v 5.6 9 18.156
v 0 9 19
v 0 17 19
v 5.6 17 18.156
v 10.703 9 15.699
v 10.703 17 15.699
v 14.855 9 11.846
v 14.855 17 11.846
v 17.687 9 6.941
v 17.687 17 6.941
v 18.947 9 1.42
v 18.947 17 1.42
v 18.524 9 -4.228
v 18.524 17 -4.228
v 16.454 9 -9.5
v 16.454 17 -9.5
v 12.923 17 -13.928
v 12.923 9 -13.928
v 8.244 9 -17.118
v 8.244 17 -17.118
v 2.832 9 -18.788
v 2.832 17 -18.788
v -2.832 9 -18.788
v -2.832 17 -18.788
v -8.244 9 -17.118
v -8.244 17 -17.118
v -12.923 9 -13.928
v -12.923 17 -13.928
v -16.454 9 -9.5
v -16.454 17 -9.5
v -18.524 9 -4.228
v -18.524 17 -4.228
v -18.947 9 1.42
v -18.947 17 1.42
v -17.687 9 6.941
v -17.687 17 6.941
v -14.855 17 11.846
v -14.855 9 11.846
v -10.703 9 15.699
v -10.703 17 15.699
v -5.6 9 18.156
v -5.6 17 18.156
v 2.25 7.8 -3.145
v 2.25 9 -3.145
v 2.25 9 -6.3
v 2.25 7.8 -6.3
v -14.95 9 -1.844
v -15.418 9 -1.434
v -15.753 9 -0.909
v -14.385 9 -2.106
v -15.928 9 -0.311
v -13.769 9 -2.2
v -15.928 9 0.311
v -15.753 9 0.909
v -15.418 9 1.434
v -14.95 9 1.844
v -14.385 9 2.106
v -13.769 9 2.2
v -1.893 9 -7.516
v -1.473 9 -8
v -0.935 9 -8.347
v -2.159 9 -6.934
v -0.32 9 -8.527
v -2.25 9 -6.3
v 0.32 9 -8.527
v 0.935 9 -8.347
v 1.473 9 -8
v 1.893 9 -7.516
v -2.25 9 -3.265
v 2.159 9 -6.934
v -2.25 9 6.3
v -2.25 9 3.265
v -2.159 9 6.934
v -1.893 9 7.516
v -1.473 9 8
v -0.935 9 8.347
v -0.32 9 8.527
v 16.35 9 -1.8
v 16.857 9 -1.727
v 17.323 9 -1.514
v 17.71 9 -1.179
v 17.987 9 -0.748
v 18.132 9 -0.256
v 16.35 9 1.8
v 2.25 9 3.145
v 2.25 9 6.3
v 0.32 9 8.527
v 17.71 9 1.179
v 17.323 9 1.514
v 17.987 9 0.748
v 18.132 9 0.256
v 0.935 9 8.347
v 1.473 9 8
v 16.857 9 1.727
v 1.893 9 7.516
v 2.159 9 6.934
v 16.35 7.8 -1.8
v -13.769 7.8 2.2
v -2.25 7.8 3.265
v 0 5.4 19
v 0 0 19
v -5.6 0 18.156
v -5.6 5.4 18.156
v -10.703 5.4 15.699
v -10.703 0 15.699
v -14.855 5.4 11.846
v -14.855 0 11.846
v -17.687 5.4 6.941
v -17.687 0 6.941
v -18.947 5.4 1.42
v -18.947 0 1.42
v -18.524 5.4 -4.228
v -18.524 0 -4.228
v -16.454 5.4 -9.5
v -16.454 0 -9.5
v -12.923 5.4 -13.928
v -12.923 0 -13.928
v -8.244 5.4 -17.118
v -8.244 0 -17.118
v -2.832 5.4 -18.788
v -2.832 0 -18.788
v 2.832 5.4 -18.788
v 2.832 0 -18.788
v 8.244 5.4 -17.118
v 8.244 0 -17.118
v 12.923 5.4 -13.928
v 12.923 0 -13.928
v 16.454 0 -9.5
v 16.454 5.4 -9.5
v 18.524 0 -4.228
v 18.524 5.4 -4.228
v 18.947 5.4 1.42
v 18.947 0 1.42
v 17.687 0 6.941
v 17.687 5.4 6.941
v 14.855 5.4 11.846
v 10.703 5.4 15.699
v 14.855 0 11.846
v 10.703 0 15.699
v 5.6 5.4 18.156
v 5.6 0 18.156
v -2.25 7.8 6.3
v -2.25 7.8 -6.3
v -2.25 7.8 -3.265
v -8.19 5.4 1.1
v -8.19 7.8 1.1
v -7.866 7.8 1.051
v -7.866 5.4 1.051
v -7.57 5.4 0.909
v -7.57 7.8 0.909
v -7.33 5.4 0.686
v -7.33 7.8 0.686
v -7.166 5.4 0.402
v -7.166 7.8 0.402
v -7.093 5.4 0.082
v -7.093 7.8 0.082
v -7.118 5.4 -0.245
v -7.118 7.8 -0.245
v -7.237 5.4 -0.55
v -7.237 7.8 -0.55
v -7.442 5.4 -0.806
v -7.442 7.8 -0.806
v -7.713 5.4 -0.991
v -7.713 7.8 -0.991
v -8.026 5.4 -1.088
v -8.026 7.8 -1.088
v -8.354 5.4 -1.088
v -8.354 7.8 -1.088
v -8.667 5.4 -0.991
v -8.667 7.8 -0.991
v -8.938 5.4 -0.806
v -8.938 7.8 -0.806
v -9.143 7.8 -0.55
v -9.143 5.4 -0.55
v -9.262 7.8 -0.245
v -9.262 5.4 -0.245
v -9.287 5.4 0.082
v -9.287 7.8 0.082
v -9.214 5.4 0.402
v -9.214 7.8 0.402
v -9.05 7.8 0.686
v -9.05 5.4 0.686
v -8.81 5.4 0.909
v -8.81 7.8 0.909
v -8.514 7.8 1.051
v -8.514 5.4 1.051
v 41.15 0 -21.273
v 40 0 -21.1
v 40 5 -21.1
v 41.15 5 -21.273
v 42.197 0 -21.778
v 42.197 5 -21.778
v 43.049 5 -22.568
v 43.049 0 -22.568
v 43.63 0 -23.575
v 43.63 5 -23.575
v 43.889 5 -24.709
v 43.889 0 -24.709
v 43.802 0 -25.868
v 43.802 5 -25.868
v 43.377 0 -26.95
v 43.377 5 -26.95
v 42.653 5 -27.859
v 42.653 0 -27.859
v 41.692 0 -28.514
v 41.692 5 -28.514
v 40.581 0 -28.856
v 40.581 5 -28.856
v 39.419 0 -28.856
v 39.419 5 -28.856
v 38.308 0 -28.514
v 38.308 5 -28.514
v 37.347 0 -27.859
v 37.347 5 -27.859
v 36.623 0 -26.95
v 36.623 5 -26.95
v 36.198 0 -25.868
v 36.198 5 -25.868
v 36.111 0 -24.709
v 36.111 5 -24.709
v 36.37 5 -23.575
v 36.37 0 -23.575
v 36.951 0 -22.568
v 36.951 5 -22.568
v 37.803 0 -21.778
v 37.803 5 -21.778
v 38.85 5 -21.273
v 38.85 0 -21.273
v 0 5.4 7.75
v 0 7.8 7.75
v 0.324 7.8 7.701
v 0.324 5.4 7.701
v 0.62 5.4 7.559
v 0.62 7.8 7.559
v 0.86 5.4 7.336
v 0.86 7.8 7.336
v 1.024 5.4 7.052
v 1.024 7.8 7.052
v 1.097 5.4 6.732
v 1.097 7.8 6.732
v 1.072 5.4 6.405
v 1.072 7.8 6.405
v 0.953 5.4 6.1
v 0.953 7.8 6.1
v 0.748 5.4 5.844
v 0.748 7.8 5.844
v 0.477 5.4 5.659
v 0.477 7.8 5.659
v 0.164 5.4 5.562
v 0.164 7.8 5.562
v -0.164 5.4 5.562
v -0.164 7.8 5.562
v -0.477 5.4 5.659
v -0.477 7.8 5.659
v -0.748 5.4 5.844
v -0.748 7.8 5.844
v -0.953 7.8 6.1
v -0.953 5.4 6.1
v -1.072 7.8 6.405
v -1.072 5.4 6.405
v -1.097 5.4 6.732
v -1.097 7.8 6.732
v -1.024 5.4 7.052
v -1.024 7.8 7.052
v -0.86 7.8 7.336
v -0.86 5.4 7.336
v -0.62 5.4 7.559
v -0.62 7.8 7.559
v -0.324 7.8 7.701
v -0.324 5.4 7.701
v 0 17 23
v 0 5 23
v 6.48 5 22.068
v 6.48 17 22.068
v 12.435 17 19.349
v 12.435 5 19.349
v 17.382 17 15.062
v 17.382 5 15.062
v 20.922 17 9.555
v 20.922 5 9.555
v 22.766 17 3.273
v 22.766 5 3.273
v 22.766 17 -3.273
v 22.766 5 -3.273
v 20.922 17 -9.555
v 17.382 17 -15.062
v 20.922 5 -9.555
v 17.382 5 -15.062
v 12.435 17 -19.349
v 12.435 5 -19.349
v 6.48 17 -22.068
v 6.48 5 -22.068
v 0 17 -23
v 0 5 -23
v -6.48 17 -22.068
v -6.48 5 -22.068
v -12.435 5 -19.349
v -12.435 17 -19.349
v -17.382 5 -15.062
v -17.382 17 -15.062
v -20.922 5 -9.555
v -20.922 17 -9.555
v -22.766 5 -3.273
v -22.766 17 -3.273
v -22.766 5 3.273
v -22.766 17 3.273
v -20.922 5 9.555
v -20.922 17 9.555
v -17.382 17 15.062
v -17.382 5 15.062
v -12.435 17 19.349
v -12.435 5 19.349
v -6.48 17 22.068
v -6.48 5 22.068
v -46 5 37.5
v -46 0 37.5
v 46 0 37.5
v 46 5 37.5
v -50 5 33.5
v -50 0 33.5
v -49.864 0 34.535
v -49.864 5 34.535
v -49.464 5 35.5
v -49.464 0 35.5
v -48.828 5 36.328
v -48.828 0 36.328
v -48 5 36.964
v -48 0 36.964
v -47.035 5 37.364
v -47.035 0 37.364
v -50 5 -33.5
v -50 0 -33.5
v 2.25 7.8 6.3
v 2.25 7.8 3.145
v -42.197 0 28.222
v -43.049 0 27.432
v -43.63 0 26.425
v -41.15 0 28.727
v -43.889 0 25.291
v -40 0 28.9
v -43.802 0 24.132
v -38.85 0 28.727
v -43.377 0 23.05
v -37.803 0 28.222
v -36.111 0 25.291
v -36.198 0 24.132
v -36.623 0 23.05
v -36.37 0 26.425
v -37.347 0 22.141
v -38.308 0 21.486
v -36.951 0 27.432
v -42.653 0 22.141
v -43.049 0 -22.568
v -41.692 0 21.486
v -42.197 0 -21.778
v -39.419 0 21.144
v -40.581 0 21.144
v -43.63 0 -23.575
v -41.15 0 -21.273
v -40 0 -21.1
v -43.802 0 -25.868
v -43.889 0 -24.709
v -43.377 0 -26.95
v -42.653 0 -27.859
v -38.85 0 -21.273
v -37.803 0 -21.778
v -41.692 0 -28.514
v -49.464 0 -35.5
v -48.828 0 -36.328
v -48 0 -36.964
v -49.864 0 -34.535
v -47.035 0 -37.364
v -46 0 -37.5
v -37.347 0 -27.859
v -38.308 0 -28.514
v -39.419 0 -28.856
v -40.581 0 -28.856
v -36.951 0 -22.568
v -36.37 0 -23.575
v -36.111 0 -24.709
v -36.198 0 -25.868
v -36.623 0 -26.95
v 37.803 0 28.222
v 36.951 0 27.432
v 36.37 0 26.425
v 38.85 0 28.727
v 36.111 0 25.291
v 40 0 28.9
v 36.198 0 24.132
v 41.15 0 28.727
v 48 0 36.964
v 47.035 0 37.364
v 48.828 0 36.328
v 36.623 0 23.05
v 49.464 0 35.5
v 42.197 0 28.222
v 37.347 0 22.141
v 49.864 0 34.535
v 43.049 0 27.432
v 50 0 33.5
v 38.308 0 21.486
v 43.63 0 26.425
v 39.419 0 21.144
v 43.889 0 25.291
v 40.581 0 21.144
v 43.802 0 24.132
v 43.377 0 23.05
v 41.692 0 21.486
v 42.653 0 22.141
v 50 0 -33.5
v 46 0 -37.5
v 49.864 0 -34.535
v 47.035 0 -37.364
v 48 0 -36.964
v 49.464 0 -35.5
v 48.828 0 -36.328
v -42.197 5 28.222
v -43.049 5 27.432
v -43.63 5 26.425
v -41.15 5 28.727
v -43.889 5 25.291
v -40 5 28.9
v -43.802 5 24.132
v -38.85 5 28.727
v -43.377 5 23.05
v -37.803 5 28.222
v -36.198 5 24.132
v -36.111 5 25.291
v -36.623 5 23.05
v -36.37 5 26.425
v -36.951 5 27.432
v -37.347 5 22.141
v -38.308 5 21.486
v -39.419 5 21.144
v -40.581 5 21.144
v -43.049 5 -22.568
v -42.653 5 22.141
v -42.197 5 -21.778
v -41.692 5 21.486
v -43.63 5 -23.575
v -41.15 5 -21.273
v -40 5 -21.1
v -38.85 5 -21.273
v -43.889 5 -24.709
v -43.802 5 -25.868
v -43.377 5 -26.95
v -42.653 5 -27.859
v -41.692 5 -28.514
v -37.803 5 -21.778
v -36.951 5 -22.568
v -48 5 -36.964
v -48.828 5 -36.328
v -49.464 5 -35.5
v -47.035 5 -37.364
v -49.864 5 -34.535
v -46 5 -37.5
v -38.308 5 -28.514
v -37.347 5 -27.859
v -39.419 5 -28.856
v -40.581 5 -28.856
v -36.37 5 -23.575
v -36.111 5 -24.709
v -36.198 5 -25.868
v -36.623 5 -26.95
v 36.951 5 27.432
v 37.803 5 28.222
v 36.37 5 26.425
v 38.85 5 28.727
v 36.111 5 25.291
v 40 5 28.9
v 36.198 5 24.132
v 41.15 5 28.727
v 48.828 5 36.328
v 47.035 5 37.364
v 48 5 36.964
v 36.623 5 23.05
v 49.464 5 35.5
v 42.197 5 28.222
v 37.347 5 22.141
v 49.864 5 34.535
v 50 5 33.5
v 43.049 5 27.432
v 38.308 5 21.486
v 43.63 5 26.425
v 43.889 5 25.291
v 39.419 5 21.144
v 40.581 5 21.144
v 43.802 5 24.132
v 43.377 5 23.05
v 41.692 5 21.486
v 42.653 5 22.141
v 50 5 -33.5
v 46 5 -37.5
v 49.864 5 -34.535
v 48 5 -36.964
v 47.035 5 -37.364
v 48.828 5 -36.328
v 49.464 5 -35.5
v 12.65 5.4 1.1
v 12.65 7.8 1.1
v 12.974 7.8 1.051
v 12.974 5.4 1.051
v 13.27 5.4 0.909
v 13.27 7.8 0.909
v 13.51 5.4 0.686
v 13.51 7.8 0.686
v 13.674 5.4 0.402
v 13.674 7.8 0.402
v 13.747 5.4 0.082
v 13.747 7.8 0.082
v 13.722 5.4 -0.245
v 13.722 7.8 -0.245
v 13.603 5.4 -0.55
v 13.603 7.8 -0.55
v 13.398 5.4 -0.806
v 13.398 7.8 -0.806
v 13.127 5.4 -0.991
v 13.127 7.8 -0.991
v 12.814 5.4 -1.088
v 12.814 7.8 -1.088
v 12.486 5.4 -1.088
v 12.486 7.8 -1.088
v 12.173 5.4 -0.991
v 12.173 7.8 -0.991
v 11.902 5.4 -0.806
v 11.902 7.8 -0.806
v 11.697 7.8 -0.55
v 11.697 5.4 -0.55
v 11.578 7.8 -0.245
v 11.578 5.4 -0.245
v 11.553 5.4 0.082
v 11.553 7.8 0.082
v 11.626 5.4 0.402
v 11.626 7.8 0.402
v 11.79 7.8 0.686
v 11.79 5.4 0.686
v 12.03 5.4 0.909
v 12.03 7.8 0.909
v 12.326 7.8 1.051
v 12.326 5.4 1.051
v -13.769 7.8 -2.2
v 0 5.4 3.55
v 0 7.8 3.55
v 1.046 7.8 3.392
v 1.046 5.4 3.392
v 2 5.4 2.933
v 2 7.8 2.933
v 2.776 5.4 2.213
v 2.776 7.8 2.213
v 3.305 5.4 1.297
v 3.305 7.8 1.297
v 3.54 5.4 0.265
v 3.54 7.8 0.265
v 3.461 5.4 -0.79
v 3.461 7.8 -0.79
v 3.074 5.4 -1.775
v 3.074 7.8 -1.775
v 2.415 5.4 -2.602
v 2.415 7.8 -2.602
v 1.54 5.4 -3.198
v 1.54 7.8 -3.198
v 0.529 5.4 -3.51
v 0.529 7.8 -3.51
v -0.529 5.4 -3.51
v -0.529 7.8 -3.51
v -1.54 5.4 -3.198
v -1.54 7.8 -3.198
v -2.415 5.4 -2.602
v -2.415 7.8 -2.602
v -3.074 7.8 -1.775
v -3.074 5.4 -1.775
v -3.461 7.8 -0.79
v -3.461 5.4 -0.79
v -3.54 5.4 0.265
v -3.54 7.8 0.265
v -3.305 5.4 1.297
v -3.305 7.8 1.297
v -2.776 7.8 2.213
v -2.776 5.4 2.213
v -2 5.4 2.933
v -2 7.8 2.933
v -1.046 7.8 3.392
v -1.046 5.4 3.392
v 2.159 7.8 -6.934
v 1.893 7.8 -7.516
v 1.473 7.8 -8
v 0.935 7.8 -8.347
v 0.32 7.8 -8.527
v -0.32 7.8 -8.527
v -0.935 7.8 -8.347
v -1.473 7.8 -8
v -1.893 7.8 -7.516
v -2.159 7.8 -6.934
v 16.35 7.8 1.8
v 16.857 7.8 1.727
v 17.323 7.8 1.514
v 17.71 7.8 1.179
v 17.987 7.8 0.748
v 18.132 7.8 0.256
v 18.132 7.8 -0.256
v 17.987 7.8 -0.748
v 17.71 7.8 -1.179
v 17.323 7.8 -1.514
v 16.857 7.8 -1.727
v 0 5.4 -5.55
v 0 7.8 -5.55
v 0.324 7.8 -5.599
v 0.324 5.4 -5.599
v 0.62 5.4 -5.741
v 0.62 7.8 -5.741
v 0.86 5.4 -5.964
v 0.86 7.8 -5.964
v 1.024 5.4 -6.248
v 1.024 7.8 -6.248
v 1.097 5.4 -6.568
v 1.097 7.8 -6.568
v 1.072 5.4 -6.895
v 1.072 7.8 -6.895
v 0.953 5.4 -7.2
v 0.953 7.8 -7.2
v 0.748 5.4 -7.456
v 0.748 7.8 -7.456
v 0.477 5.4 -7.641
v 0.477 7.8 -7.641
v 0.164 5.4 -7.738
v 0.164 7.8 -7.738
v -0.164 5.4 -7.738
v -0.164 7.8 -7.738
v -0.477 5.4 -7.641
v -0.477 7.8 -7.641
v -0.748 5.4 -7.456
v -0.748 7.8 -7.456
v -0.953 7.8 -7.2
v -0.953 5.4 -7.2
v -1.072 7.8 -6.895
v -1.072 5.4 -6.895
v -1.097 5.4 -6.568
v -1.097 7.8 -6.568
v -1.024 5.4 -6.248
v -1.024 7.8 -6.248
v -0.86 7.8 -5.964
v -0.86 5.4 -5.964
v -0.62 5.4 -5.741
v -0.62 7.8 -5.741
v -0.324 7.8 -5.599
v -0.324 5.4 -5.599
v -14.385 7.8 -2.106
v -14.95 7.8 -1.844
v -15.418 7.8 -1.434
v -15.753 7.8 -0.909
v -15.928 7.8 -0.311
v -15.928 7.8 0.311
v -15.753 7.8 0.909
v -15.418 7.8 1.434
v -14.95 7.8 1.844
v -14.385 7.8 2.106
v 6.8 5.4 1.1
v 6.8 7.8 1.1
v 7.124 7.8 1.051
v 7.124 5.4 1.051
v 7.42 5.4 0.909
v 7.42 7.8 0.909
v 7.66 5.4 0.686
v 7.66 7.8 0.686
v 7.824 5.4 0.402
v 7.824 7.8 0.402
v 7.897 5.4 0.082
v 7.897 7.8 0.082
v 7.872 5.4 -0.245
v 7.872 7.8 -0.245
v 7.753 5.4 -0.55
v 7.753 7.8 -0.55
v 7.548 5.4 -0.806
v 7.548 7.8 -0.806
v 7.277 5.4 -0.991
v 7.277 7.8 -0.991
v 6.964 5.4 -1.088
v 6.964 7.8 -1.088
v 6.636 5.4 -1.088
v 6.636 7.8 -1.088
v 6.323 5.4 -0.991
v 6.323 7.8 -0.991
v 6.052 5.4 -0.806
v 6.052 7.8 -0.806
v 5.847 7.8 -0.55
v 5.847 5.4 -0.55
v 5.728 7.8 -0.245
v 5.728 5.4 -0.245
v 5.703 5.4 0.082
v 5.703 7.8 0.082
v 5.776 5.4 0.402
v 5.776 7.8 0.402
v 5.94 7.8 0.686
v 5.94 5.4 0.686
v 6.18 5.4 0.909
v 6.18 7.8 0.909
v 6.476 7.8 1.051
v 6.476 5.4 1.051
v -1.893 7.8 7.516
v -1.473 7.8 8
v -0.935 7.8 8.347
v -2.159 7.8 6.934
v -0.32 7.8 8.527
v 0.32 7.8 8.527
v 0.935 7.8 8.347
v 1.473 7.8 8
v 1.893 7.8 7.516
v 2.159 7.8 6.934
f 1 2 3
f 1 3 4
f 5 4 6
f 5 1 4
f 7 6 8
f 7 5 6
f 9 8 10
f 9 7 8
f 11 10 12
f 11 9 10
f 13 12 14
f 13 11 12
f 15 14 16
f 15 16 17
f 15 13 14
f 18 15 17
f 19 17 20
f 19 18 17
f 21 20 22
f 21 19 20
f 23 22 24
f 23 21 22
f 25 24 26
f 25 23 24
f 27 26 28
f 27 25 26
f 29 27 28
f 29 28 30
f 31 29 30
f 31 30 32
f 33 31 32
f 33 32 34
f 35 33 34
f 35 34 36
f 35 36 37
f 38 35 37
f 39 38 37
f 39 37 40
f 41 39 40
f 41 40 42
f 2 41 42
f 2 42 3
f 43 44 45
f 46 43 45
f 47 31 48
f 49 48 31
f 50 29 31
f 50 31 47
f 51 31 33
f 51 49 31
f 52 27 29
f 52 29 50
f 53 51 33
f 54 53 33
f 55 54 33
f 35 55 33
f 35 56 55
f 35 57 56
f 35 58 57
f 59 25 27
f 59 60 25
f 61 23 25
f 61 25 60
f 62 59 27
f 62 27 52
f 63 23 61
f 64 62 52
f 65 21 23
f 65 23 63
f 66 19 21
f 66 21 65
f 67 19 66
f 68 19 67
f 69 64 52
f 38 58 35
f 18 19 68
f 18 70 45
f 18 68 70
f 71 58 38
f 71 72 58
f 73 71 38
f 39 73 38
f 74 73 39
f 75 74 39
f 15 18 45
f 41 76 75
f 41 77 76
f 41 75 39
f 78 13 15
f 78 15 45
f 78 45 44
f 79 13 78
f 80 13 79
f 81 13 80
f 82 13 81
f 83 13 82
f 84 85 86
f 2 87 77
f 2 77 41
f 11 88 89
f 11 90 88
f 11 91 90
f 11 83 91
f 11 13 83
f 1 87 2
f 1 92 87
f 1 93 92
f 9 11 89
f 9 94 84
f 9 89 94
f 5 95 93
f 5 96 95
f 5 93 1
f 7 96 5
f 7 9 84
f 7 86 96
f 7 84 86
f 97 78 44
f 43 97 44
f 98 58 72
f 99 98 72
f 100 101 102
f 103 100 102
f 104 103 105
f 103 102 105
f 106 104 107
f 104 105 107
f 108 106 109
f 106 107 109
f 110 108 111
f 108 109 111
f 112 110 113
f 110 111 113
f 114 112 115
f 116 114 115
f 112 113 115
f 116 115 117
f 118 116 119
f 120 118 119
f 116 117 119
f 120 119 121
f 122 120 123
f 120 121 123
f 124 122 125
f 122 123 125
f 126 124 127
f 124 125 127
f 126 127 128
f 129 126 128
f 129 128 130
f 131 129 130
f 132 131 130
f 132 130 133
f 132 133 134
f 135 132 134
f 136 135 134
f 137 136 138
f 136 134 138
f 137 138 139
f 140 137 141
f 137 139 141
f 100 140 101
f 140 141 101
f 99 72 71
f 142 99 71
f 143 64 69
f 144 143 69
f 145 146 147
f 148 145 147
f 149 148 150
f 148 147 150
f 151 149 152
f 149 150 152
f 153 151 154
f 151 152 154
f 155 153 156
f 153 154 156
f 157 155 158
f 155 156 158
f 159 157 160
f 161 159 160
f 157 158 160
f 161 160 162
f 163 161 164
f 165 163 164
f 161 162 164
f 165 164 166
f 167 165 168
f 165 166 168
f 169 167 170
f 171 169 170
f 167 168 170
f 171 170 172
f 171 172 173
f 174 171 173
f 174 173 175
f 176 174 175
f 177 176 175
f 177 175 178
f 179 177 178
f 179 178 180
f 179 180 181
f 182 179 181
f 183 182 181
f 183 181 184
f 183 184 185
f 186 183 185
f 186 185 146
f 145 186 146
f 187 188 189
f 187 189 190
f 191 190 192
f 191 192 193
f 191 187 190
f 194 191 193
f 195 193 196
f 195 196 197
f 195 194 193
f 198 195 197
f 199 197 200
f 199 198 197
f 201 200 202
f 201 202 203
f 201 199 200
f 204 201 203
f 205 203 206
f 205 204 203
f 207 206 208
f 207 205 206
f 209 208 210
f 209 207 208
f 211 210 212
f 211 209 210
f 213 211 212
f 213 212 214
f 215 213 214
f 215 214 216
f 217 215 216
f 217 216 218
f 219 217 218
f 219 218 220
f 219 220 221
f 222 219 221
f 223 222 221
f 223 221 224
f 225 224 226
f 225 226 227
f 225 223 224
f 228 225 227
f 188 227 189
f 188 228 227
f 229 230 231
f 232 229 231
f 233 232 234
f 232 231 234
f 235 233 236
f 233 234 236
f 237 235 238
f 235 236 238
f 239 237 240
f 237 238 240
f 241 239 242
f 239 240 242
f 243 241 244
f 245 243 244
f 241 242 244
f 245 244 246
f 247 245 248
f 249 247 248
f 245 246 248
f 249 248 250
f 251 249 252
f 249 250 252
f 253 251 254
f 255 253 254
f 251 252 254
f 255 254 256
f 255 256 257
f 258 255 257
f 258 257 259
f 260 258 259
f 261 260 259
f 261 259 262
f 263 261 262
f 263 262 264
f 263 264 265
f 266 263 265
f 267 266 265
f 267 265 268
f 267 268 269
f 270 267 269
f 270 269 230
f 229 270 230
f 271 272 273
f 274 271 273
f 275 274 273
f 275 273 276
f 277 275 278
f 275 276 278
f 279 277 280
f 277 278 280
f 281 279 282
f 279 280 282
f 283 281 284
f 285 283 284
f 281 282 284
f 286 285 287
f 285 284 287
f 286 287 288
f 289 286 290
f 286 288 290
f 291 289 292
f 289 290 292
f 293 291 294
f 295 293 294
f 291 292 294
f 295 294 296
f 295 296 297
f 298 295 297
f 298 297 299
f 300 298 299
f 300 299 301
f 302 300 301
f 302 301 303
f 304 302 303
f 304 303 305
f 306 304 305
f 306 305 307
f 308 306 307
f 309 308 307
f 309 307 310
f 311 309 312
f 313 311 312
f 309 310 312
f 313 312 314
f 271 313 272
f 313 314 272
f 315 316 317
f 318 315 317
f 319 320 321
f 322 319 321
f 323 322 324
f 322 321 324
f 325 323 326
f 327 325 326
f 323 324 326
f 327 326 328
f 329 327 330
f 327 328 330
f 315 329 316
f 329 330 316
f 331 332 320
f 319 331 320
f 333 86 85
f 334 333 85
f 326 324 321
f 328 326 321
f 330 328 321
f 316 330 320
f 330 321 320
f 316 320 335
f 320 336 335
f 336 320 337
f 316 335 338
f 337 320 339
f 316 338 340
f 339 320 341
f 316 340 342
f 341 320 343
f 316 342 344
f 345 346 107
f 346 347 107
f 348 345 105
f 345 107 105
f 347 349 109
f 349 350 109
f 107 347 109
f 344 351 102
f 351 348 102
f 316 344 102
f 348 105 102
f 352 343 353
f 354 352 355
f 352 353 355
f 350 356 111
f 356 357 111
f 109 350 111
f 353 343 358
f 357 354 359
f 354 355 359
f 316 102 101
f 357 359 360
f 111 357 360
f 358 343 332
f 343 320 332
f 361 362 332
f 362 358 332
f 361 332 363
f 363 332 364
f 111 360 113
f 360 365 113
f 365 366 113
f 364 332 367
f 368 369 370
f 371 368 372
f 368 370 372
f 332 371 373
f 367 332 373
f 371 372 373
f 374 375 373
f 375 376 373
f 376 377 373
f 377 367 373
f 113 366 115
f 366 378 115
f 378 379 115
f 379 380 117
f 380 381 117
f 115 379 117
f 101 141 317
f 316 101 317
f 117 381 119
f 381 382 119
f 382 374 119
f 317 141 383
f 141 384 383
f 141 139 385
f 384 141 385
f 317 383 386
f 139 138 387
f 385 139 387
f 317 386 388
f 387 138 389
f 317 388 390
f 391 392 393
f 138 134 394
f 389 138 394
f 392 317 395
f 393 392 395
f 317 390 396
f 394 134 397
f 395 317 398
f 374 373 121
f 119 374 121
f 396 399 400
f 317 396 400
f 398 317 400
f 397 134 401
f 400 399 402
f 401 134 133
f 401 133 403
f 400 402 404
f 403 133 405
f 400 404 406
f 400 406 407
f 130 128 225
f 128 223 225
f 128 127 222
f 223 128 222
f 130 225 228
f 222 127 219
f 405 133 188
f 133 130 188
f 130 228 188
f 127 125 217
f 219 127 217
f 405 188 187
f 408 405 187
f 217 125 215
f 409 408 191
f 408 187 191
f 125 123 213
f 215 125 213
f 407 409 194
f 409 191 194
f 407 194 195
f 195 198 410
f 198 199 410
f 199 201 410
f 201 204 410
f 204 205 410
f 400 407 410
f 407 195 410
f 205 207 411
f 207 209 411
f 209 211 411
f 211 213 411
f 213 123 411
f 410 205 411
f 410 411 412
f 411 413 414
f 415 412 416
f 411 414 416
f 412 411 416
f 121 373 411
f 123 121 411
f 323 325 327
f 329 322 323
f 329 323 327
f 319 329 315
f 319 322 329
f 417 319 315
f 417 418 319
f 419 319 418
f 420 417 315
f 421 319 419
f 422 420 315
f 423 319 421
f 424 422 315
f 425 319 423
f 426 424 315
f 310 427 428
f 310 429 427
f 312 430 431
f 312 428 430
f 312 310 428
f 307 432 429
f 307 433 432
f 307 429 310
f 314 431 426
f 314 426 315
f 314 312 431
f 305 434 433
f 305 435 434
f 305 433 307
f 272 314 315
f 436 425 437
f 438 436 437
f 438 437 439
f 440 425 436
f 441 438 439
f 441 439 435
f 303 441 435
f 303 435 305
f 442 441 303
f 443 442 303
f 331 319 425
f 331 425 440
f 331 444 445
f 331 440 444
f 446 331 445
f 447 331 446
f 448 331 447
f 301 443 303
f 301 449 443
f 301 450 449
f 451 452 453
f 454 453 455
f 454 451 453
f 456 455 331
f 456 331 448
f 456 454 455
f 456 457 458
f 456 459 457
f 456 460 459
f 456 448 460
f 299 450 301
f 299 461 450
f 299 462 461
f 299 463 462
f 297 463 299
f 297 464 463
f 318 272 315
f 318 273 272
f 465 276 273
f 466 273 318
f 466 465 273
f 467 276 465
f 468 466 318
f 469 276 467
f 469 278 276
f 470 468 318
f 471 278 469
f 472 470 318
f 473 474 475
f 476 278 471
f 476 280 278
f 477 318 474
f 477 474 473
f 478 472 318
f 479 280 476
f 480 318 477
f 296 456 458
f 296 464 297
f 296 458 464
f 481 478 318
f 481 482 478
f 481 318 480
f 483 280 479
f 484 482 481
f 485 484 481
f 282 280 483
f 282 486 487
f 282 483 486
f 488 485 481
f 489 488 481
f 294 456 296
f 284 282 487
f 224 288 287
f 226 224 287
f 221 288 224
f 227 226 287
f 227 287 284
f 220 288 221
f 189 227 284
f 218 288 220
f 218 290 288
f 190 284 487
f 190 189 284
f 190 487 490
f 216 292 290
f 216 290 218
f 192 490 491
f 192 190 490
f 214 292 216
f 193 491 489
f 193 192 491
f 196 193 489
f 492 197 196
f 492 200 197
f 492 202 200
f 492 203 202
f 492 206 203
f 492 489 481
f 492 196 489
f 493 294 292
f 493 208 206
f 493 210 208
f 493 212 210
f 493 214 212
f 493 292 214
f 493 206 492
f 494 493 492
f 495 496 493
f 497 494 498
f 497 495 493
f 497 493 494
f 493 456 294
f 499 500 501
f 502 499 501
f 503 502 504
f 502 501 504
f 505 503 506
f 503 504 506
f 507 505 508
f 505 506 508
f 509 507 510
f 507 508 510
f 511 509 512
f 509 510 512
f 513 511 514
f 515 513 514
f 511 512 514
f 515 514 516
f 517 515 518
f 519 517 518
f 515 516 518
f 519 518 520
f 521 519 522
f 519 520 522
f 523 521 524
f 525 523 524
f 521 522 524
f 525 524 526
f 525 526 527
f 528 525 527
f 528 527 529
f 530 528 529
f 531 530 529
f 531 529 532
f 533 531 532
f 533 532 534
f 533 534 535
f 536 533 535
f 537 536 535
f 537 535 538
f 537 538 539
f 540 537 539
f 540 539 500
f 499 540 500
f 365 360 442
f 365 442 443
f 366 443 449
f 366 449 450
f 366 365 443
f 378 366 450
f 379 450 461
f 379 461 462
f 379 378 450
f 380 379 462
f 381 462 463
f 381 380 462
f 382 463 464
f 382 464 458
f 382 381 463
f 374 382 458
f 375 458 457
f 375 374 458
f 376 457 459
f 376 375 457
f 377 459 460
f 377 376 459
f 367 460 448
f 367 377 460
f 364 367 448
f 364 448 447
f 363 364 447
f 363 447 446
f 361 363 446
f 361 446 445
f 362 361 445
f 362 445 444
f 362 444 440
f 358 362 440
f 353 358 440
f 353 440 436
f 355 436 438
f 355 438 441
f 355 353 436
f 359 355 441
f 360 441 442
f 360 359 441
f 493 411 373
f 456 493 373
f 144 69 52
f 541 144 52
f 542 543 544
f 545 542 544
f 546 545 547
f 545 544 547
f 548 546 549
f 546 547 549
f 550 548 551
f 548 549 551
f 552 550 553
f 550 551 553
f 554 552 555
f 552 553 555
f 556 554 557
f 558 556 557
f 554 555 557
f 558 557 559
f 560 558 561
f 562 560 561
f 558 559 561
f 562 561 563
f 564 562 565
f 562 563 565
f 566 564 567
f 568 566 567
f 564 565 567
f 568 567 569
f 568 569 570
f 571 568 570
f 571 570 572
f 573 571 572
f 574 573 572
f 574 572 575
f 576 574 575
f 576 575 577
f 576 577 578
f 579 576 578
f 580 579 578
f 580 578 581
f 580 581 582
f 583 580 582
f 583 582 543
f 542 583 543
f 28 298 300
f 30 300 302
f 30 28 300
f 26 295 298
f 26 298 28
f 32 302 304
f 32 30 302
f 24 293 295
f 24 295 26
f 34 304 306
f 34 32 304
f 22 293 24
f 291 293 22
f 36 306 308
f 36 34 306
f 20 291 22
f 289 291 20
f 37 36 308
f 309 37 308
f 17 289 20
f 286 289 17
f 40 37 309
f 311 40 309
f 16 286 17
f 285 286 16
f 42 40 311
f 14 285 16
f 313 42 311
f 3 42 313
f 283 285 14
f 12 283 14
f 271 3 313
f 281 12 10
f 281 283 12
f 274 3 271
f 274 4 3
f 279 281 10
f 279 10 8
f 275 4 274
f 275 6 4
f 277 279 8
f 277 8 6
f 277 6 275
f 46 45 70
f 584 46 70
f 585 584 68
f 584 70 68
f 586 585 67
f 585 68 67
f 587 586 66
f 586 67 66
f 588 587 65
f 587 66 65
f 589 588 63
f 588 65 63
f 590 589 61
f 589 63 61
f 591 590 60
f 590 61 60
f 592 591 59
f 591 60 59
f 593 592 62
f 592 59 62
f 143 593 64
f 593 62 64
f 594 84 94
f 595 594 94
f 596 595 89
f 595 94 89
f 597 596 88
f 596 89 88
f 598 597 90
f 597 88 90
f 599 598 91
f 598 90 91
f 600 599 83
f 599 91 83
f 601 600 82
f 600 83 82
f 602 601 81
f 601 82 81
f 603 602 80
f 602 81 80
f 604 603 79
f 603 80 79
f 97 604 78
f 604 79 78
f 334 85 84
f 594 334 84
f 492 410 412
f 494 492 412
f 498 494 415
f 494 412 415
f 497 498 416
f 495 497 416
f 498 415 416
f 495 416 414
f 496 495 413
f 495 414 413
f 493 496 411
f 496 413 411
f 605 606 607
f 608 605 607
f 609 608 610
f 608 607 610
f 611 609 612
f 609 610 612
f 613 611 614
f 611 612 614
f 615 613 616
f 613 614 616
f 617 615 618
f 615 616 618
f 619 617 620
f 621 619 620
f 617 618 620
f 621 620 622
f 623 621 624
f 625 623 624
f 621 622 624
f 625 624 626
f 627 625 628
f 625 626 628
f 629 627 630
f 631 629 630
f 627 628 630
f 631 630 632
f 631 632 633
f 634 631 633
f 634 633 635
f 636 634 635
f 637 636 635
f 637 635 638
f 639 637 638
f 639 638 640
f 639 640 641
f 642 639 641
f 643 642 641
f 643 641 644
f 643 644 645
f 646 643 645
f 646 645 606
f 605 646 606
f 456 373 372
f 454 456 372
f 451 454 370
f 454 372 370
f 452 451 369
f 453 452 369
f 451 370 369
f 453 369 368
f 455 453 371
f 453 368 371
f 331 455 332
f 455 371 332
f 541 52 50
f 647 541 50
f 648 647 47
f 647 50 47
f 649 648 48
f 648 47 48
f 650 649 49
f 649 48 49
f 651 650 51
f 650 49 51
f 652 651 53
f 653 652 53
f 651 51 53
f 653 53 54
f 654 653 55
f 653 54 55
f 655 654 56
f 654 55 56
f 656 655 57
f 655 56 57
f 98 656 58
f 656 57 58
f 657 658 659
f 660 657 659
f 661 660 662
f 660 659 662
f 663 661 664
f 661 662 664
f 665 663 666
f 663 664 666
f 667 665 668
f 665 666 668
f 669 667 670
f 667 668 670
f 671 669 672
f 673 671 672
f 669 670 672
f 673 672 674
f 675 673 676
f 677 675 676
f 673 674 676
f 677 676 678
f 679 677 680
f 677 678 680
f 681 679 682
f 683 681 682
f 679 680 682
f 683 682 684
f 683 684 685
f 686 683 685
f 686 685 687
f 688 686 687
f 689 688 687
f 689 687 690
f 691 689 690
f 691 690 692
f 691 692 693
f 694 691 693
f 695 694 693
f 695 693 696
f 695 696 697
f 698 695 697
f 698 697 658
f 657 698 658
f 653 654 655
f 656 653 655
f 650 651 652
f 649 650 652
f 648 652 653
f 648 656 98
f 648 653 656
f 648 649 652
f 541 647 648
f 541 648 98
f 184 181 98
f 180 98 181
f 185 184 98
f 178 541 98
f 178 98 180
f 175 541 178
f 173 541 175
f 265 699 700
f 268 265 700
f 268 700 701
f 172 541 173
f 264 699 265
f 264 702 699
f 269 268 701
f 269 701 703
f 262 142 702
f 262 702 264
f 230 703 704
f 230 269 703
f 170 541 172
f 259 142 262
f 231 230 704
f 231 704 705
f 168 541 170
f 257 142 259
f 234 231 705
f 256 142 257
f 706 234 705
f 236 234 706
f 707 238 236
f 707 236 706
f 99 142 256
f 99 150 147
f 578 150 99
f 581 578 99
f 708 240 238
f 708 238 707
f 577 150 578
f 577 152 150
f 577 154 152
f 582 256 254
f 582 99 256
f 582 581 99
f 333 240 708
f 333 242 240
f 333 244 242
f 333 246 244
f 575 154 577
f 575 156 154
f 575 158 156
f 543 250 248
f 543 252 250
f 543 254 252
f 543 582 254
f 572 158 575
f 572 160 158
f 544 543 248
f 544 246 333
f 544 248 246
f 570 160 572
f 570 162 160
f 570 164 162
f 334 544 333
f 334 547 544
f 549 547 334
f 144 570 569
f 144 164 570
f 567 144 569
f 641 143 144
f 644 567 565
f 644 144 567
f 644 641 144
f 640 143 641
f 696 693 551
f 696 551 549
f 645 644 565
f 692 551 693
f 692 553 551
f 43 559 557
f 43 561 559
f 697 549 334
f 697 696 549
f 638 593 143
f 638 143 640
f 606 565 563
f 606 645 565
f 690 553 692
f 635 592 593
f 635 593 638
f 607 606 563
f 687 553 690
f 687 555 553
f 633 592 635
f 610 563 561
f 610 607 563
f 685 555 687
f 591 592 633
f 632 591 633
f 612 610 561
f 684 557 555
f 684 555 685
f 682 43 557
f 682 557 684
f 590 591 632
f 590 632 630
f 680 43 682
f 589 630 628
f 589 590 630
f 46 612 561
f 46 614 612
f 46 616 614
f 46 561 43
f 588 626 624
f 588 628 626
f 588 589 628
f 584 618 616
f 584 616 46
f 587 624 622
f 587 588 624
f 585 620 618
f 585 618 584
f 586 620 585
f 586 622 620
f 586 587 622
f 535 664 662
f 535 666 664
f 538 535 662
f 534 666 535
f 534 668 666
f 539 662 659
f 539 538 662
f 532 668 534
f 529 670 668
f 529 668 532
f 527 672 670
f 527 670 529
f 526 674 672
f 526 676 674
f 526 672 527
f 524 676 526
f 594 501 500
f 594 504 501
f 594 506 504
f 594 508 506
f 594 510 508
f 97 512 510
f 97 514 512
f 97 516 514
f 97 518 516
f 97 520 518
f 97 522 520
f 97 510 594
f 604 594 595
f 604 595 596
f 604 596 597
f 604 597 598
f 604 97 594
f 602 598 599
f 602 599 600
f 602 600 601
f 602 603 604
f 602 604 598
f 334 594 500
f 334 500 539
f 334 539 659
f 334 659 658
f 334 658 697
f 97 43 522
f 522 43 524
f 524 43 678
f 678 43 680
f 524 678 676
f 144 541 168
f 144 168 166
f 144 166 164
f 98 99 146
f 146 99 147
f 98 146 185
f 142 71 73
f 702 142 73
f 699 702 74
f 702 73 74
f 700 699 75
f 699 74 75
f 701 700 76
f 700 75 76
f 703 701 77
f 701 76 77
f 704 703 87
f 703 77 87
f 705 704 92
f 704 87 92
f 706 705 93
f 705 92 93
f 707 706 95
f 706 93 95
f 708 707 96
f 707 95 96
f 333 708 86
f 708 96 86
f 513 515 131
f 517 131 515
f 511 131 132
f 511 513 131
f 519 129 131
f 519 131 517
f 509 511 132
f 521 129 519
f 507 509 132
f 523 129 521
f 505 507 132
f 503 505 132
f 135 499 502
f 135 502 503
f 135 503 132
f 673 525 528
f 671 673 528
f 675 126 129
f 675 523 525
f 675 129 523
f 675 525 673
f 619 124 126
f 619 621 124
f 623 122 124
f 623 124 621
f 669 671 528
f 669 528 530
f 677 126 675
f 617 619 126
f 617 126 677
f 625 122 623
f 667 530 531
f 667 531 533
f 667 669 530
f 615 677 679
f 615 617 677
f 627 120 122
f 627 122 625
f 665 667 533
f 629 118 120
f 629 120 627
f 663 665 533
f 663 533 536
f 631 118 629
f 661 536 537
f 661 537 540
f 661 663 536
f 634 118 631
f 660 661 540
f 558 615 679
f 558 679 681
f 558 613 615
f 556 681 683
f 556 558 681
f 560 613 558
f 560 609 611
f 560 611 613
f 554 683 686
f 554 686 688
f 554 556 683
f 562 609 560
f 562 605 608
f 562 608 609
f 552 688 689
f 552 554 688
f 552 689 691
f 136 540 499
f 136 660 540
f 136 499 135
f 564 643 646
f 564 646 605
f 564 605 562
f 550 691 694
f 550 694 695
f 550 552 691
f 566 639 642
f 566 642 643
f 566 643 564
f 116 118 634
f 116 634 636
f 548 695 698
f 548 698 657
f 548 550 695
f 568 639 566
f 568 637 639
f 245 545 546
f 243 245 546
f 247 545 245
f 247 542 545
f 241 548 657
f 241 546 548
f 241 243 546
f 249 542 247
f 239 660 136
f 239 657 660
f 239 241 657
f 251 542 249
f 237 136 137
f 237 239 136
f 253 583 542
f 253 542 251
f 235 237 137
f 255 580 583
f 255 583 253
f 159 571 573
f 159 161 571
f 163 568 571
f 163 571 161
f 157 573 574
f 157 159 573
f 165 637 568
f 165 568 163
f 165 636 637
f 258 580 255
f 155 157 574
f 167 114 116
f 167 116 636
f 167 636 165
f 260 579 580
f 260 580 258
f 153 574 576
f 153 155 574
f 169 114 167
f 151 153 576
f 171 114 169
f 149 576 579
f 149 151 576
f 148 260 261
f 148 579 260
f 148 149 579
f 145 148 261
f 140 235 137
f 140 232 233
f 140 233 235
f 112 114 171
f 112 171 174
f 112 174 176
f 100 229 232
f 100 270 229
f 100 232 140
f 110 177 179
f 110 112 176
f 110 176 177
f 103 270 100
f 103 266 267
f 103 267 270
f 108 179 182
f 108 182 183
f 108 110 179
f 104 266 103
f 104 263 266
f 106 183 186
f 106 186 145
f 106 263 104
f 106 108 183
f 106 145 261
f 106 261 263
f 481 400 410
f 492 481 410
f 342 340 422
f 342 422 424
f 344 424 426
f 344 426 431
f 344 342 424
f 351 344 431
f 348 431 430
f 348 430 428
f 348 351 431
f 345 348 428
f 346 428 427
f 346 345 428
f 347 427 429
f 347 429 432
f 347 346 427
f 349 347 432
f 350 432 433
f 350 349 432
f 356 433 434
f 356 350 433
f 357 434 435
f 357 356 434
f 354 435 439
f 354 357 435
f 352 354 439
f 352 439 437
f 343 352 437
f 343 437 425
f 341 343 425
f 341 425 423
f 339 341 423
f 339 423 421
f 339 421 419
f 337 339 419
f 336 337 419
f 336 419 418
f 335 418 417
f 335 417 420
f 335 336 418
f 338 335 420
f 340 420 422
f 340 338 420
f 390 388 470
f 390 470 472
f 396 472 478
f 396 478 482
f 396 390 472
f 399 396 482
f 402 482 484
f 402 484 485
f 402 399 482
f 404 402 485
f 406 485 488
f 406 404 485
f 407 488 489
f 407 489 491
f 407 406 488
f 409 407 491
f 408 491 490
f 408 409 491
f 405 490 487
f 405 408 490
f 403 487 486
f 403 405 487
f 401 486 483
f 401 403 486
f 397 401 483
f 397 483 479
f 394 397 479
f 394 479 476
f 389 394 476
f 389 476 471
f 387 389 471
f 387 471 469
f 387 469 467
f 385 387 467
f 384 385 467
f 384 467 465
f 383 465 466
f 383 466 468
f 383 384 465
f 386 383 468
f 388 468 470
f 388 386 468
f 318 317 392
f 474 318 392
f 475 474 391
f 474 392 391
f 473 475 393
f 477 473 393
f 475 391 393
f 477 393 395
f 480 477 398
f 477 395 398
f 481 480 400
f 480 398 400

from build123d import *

# Parameters (mm, degrees)
ESQUISSE1_R             = 3.9
BOSS_EXTRU_1_DEPTH      = 5
ESQUISSE2_R             = 23
ESQUISSE2_R_2           = 19
BOSS_EXTRU_2_DEPTH      = 12
ESQUISSE5_R             = 19
BOSS_EXTRU_3_DEPTH      = 4
ENL_V_MAT_EXTRU_4_DEPTH = 1.2
ESQUISSE9_R             = 3.55
ENL_V_MAT_EXTRU_5_DEPTH = 64.173491276
ESQUISSE6_R             = 19
ENL_V_MAT_EXTRU_3_DEPTH = 5.4
ESQUISSE10_R            = 1.1
ESQUISSE10_R_2          = 0.5
ENL_V_MAT_EXTRU_6_DEPTH = 64.173491276


with BuildPart() as part:
    # Esquisse1 → Boss.-Extru.1 (new body)
    with BuildSketch(Plane(origin=(0, 0, 0), x_dir=(1, 0, 0), z_dir=(0, 1, 0))):
        with BuildLine():
            Line((46, 37.5), (-46, 37.5))
            ThreePointArc((-46, 37.5), (-48.828427125, 36.328427125), (-50, 33.5))
            Line((-50, 33.5), (-50, -33.5))
            ThreePointArc((-50, -33.5), (-48.828427125, -36.328427125), (-46, -37.5))
            Line((-46, -37.5), (46, -37.5))
            ThreePointArc((46, -37.5), (48.828427125, -36.328427125), (50, -33.5))
            Line((50, -33.5), (50, 33.5))
            ThreePointArc((50, 33.5), (48.828427125, 36.328427125), (46, 37.5))
        make_face()
        with Locations(Location((-40, -25, 0), (0, 0, 270))):
            Circle(ESQUISSE1_R, mode=Mode.SUBTRACT)
        with Locations(Location((40, -25, 0), (0, 0, 270))):
            Circle(ESQUISSE1_R, mode=Mode.SUBTRACT)
        with Locations(Location((-40, 25, 0), (0, 0, 270))):
            Circle(ESQUISSE1_R, mode=Mode.SUBTRACT)
        with Locations(Location((40, 25, 0), (0, 0, 270))):
            Circle(ESQUISSE1_R, mode=Mode.SUBTRACT)
    extrude(amount=BOSS_EXTRU_1_DEPTH)

    # Esquisse2 → Boss.-Extru.2 (add)
    with BuildSketch(Plane(origin=(0, 5, 0), x_dir=(1, 0, 0), z_dir=(0, 1, 0))):
        with Locations(Location((0, 0, 0), (0, 0, 270))):
            Circle(ESQUISSE2_R)
        with Locations(Location((0, 0, 0), (0, 0, 270))):
            Circle(ESQUISSE2_R_2, mode=Mode.SUBTRACT)
    extrude(amount=BOSS_EXTRU_2_DEPTH)

    # Esquisse5 → Boss.-Extru.3 (add)
    with BuildSketch(Plane(origin=(0, 5, 0), x_dir=(1, 0, 0), z_dir=(0, 1, 0))):
        with Locations(Location((0, 0, 0), (0, 0, 270))):
            Circle(ESQUISSE5_R)
    extrude(amount=BOSS_EXTRU_3_DEPTH)

    # Esquisse8 → Enlèv. mat.-Extru.4 (cut)
    with BuildSketch(Plane(origin=(0, 9, 0), x_dir=(1, 0, 0), z_dir=(0, 1, 0))):
        with BuildLine():
            Line((2.25, -6.3), (2.25, -3.145492982))
            Line((2.25, -3.145492982), (16.35, -1.8))
            ThreePointArc((16.35, -1.8), (18.15, 0), (16.35, 1.8))
            Line((16.35, 1.8), (2.25, 3.145492982))
            Line((2.25, 3.145492982), (2.25, 6.3))
            ThreePointArc((2.25, 6.3), (0, 8.55), (-2.25, 6.3))
            Line((-2.25, 6.3), (-2.25, 3.264730494))
            Line((-2.25, 3.264730494), (-13.769370638, 2.199914721))
            ThreePointArc((-13.769370638, 2.199914721), (-15.95, 0), (-13.769370638, -2.199914721))
            Line((-13.769370638, -2.199914721), (-2.25, -3.264730494))
            Line((-2.25, -3.264730494), (-2.25, -6.3))
            ThreePointArc((-2.25, -6.3), (0, -8.55), (2.25, -6.3))
        make_face()
    extrude(amount=-ENL_V_MAT_EXTRU_4_DEPTH, mode=Mode.SUBTRACT)

    # Esquisse9 → Enlèv. mat.-Extru.5 (cut, through all)
    with BuildSketch(Plane(origin=(0, 7.8, 0), x_dir=(1, 0, 0), z_dir=(0, 1, 0))):
        with Locations(Location((0, 0, 0), (0, 0, 270))):
            Circle(ESQUISSE9_R)
    extrude(amount=-ENL_V_MAT_EXTRU_5_DEPTH, mode=Mode.SUBTRACT)

    # Esquisse6 → Enlèv. mat.-Extru.3 (cut)
    with BuildSketch(Plane.XZ):
        with Locations(Location((0, 0, 0), (0, 0, 90))):
            Circle(ESQUISSE6_R)
    extrude(amount=-ENL_V_MAT_EXTRU_3_DEPTH, mode=Mode.SUBTRACT)

    # Esquisse10 → Enlèv. mat.-Extru.6 (cut, through all)
    # profile 1 of 10: a face of its own
    with BuildSketch(Plane(origin=(0, 7.8, 0), x_dir=(1, 0, 0), z_dir=(0, 1, 0))):
        with Locations(Location((0, 6.65, 0), (0, 0, 270))):
            Circle(ESQUISSE10_R)
        with Locations((0, 6.65)):
            Circle(ESQUISSE10_R_2, mode=Mode.SUBTRACT)
    # profile 2 of 10: a face of its own
    with BuildSketch(Plane(origin=(0, 7.8, 0), x_dir=(1, 0, 0), z_dir=(0, 1, 0))):
        with Locations((0, 6.65)):
            Circle(ESQUISSE10_R_2)
    # profile 3 of 10: a face of its own
    with BuildSketch(Plane(origin=(0, 7.8, 0), x_dir=(1, 0, 0), z_dir=(0, 1, 0))):
        with Locations(Location((0, -6.65, 0), (0, 0, 270))):
            Circle(ESQUISSE10_R)
        with Locations((0, -6.65)):
            Circle(ESQUISSE10_R_2, mode=Mode.SUBTRACT)
    # profile 4 of 10: a face of its own
    with BuildSketch(Plane(origin=(0, 7.8, 0), x_dir=(1, 0, 0), z_dir=(0, 1, 0))):
        with Locations((0, -6.65)):
            Circle(ESQUISSE10_R_2)
    # profile 5 of 10: a face of its own
    with BuildSketch(Plane(origin=(0, 7.8, 0), x_dir=(1, 0, 0), z_dir=(0, 1, 0))):
        with Locations(Location((-8.19, 0, 0), (0, 0, 270))):
            Circle(ESQUISSE10_R)
        with Locations((-8.19, 0)):
            Circle(ESQUISSE10_R_2, mode=Mode.SUBTRACT)
    # profile 6 of 10: a face of its own
    with BuildSketch(Plane(origin=(0, 7.8, 0), x_dir=(1, 0, 0), z_dir=(0, 1, 0))):
        with Locations((-8.19, 0)):
            Circle(ESQUISSE10_R_2)
    # profile 7 of 10: a face of its own
    with BuildSketch(Plane(origin=(0, 7.8, 0), x_dir=(1, 0, 0), z_dir=(0, 1, 0))):
        with Locations(Location((6.8, 0, 0), (0, 0, 270))):
            Circle(ESQUISSE10_R)
        with Locations((6.8, 0)):
            Circle(ESQUISSE10_R_2, mode=Mode.SUBTRACT)
    # profile 8 of 10: a face of its own
    with BuildSketch(Plane(origin=(0, 7.8, 0), x_dir=(1, 0, 0), z_dir=(0, 1, 0))):
        with Locations((6.8, 0)):
            Circle(ESQUISSE10_R_2)
    # profile 9 of 10: a face of its own
    with BuildSketch(Plane(origin=(0, 7.8, 0), x_dir=(1, 0, 0), z_dir=(0, 1, 0))):
        with Locations(Location((12.65, 0, 0), (0, 0, 270))):
            Circle(ESQUISSE10_R)
        with Locations((12.65, 0)):
            Circle(ESQUISSE10_R_2, mode=Mode.SUBTRACT)
    # profile 10 of 10: a face of its own
    with BuildSketch(Plane(origin=(0, 7.8, 0), x_dir=(1, 0, 0), z_dir=(0, 1, 0))):
        with Locations((12.65, 0)):
            Circle(ESQUISSE10_R_2)
    extrude(amount=-ENL_V_MAT_EXTRU_6_DEPTH, mode=Mode.SUBTRACT)


solid = part.part
